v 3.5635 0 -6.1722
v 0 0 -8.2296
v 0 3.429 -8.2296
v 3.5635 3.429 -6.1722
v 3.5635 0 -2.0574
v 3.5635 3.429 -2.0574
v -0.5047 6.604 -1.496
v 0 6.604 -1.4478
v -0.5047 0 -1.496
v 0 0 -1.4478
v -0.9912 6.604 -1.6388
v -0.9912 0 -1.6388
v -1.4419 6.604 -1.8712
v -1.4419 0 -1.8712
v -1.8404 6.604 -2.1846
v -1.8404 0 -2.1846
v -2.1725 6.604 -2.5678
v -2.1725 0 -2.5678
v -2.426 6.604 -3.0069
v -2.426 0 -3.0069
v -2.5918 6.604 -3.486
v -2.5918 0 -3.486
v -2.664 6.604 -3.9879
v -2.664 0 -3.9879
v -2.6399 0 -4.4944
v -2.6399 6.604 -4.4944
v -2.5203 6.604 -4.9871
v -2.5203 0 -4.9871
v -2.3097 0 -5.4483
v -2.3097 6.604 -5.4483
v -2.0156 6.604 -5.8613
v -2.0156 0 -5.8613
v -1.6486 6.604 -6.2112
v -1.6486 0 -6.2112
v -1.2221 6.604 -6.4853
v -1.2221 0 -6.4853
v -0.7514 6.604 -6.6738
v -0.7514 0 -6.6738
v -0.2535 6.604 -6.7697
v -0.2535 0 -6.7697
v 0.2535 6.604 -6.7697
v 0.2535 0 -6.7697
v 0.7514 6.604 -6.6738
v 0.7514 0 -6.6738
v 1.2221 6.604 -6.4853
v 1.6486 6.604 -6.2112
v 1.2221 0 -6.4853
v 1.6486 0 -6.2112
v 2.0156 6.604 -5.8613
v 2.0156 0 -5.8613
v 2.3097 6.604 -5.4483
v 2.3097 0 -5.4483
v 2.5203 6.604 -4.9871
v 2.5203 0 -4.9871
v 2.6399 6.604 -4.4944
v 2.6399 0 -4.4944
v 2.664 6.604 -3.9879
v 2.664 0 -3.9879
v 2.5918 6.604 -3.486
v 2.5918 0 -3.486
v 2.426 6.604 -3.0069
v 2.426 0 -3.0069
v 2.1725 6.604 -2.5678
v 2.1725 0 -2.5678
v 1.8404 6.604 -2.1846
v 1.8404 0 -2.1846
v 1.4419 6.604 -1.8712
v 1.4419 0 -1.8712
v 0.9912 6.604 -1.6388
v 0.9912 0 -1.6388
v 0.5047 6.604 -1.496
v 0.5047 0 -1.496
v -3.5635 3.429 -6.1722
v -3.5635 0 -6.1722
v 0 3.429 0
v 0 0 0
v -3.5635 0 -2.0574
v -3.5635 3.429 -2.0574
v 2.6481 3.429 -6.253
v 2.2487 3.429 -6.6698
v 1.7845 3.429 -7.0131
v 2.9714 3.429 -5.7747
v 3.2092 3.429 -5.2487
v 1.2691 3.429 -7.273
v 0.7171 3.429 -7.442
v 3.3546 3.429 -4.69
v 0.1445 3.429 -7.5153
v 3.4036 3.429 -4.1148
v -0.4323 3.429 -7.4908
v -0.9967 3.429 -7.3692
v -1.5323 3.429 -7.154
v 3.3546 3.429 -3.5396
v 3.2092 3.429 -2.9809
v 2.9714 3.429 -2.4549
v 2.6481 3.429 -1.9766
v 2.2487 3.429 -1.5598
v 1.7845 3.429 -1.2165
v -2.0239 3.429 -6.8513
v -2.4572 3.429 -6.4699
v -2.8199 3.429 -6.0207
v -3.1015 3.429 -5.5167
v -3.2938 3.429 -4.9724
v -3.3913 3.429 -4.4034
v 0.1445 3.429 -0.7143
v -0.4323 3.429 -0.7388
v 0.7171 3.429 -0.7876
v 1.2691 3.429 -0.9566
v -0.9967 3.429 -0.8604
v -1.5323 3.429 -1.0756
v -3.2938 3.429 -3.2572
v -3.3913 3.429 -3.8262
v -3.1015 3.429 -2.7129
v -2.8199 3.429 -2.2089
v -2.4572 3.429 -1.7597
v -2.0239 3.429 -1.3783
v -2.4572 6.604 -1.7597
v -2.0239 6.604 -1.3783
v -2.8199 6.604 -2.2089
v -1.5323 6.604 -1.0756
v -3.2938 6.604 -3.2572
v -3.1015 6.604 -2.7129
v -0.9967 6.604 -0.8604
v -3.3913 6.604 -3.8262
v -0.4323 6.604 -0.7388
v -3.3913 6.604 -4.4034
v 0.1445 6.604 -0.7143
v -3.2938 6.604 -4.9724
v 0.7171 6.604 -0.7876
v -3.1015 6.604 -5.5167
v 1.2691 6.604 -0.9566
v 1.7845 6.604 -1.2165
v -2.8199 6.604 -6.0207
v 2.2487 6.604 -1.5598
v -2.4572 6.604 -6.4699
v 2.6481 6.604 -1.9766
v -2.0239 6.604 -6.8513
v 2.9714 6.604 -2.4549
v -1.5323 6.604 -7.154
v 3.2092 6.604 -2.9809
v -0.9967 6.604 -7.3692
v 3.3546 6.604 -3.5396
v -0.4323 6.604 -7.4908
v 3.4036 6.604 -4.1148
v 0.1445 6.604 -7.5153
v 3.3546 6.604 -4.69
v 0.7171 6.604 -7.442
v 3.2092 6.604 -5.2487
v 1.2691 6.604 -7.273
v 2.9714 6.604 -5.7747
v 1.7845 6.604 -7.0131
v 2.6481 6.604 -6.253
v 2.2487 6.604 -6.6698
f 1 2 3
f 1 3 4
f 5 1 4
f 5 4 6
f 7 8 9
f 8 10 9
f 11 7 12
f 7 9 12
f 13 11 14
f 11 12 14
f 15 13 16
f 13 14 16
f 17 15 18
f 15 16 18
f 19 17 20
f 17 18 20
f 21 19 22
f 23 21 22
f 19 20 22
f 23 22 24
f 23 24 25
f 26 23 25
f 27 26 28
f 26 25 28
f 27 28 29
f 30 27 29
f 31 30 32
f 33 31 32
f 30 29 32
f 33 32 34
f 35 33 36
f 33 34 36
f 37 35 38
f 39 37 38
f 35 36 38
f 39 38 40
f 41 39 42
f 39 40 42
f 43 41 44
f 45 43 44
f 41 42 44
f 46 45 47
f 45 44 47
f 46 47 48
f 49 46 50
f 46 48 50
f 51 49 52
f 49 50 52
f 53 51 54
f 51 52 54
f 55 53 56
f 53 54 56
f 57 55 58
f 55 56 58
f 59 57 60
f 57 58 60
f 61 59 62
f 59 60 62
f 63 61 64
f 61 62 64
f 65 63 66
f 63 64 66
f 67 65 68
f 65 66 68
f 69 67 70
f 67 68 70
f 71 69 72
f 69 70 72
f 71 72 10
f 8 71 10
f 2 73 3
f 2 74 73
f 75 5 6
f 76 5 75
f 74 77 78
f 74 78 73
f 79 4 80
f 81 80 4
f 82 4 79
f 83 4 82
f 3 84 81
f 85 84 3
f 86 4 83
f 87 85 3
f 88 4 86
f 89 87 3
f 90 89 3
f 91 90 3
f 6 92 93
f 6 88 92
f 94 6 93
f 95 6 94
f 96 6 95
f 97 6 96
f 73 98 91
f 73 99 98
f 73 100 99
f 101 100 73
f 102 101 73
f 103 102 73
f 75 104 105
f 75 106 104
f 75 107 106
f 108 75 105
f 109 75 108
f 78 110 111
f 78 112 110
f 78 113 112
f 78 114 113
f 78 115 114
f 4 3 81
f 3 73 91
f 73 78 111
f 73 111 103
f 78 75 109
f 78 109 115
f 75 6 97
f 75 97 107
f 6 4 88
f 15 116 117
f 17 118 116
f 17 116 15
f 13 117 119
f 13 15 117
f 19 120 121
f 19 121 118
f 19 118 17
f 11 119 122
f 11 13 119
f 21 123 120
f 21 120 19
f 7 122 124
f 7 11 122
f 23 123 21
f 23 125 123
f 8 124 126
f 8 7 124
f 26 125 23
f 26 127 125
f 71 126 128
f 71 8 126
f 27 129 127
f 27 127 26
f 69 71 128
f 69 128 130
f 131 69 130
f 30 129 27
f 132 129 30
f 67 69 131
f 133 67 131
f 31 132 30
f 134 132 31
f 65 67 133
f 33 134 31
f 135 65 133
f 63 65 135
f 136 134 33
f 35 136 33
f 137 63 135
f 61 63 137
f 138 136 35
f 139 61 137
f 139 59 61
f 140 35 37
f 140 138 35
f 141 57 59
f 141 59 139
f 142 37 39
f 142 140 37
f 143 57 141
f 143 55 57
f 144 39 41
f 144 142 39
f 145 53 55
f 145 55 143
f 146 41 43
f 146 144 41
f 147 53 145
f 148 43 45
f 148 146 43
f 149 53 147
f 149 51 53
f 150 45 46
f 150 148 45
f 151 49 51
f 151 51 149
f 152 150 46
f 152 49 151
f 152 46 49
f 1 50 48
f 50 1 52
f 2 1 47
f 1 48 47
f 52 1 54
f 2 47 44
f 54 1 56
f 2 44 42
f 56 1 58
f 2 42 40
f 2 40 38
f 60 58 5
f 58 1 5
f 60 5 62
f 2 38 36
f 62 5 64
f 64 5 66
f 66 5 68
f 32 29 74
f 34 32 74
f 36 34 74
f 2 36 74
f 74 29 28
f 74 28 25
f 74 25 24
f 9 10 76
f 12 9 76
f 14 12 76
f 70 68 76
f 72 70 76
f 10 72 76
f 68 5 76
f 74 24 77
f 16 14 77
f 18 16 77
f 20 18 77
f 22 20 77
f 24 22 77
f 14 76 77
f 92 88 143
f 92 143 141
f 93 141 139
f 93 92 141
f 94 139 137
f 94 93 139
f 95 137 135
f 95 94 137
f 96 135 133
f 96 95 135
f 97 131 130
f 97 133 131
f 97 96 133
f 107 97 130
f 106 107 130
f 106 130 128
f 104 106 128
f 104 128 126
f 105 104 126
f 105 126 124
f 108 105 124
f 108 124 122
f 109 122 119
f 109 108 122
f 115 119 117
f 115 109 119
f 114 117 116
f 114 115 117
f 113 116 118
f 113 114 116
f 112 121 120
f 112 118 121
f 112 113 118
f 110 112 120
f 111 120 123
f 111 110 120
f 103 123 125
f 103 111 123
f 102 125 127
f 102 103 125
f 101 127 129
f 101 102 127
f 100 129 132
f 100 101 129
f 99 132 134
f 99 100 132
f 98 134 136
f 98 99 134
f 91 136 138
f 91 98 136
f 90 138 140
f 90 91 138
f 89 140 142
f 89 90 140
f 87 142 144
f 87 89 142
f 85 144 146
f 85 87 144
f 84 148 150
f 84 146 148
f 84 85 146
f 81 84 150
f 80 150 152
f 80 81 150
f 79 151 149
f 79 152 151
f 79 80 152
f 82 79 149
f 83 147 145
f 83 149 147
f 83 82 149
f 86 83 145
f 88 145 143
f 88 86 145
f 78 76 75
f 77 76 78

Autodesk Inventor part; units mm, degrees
ref_plane "YZ Plane" through (0, 0, 0) normal (1, 0, 0) x (0, 1, 0)
ref_plane "XZ Plane" through (0, 0, 0) normal (0, 1, 0) x (-1, 0, 0)
ref_plane "XY Plane" through (0, 0, 0) normal (0, 0, 1) x (1, 0, 0)
sketch "Sketch1" plane through (0, 0, 0) normal (0, 1, 0) x (-1, 0, 0)
  line L0 (0, 0) -> (3.5635, -2.0574)
  line L1 (0, 0) -> (4.1148, 0) construction
  line L2 (3.5635, -2.0574) -> (3.5635, -6.1722)
  line L3 (3.5635, -6.1722) -> (0, -8.2296)
  line L4 (0, -8.2296) -> (-3.5635, -6.1722)
  line L5 (-3.5635, -6.1722) -> (-3.5635, -2.0574)
  line L6 (-3.5635, -2.0574) -> (0, 0)
  dimension "d0" = 4.1148
  dimension "d1" = 30
  dimension "d2" = 4.1148
  dimension "d3" = 4.1148
  dimension "d4" = 120
extrude "Extrusion1" add sketch "Sketch1" along normal blind 3.429
sketch "Sketch2" plane through (0, 3.429, 0) normal (0, 1, 0) x (1, 0, 0)
  line L0 (-3.5635, 2.0574) -> (0, 0) projected
  line L1 (0, 0) -> (3.5635, 2.0574) projected
  line L2 (3.5635, 2.0574) -> (3.5635, 6.1722) projected
  line L3 (3.5635, 6.1722) -> (0, 8.2296) projected
  line L4 (0, 8.2296) -> (-3.5635, 6.1722) projected
  line L5 (-3.5635, 6.1722) -> (-3.5635, 2.0574) projected
  line L6 (0, 0) -> (0, 4.1148) construction
  circle A0 centre (0, 4.1148) radius 3.4036
  dimension "d8" = 6.8072
extrude "Extrusion2" add sketch "Sketch2" along normal blind 3.175 contours A0
hole "Hole1" at (0, 6.604, -4.1148) direction (0, -1, 0) diameter 5.334 end through all
thread "Thread1" size "12-24 UNC" class "2B" standard "ANSI Unified Screw Threads" length 3.429
properties part number "HexCap"
